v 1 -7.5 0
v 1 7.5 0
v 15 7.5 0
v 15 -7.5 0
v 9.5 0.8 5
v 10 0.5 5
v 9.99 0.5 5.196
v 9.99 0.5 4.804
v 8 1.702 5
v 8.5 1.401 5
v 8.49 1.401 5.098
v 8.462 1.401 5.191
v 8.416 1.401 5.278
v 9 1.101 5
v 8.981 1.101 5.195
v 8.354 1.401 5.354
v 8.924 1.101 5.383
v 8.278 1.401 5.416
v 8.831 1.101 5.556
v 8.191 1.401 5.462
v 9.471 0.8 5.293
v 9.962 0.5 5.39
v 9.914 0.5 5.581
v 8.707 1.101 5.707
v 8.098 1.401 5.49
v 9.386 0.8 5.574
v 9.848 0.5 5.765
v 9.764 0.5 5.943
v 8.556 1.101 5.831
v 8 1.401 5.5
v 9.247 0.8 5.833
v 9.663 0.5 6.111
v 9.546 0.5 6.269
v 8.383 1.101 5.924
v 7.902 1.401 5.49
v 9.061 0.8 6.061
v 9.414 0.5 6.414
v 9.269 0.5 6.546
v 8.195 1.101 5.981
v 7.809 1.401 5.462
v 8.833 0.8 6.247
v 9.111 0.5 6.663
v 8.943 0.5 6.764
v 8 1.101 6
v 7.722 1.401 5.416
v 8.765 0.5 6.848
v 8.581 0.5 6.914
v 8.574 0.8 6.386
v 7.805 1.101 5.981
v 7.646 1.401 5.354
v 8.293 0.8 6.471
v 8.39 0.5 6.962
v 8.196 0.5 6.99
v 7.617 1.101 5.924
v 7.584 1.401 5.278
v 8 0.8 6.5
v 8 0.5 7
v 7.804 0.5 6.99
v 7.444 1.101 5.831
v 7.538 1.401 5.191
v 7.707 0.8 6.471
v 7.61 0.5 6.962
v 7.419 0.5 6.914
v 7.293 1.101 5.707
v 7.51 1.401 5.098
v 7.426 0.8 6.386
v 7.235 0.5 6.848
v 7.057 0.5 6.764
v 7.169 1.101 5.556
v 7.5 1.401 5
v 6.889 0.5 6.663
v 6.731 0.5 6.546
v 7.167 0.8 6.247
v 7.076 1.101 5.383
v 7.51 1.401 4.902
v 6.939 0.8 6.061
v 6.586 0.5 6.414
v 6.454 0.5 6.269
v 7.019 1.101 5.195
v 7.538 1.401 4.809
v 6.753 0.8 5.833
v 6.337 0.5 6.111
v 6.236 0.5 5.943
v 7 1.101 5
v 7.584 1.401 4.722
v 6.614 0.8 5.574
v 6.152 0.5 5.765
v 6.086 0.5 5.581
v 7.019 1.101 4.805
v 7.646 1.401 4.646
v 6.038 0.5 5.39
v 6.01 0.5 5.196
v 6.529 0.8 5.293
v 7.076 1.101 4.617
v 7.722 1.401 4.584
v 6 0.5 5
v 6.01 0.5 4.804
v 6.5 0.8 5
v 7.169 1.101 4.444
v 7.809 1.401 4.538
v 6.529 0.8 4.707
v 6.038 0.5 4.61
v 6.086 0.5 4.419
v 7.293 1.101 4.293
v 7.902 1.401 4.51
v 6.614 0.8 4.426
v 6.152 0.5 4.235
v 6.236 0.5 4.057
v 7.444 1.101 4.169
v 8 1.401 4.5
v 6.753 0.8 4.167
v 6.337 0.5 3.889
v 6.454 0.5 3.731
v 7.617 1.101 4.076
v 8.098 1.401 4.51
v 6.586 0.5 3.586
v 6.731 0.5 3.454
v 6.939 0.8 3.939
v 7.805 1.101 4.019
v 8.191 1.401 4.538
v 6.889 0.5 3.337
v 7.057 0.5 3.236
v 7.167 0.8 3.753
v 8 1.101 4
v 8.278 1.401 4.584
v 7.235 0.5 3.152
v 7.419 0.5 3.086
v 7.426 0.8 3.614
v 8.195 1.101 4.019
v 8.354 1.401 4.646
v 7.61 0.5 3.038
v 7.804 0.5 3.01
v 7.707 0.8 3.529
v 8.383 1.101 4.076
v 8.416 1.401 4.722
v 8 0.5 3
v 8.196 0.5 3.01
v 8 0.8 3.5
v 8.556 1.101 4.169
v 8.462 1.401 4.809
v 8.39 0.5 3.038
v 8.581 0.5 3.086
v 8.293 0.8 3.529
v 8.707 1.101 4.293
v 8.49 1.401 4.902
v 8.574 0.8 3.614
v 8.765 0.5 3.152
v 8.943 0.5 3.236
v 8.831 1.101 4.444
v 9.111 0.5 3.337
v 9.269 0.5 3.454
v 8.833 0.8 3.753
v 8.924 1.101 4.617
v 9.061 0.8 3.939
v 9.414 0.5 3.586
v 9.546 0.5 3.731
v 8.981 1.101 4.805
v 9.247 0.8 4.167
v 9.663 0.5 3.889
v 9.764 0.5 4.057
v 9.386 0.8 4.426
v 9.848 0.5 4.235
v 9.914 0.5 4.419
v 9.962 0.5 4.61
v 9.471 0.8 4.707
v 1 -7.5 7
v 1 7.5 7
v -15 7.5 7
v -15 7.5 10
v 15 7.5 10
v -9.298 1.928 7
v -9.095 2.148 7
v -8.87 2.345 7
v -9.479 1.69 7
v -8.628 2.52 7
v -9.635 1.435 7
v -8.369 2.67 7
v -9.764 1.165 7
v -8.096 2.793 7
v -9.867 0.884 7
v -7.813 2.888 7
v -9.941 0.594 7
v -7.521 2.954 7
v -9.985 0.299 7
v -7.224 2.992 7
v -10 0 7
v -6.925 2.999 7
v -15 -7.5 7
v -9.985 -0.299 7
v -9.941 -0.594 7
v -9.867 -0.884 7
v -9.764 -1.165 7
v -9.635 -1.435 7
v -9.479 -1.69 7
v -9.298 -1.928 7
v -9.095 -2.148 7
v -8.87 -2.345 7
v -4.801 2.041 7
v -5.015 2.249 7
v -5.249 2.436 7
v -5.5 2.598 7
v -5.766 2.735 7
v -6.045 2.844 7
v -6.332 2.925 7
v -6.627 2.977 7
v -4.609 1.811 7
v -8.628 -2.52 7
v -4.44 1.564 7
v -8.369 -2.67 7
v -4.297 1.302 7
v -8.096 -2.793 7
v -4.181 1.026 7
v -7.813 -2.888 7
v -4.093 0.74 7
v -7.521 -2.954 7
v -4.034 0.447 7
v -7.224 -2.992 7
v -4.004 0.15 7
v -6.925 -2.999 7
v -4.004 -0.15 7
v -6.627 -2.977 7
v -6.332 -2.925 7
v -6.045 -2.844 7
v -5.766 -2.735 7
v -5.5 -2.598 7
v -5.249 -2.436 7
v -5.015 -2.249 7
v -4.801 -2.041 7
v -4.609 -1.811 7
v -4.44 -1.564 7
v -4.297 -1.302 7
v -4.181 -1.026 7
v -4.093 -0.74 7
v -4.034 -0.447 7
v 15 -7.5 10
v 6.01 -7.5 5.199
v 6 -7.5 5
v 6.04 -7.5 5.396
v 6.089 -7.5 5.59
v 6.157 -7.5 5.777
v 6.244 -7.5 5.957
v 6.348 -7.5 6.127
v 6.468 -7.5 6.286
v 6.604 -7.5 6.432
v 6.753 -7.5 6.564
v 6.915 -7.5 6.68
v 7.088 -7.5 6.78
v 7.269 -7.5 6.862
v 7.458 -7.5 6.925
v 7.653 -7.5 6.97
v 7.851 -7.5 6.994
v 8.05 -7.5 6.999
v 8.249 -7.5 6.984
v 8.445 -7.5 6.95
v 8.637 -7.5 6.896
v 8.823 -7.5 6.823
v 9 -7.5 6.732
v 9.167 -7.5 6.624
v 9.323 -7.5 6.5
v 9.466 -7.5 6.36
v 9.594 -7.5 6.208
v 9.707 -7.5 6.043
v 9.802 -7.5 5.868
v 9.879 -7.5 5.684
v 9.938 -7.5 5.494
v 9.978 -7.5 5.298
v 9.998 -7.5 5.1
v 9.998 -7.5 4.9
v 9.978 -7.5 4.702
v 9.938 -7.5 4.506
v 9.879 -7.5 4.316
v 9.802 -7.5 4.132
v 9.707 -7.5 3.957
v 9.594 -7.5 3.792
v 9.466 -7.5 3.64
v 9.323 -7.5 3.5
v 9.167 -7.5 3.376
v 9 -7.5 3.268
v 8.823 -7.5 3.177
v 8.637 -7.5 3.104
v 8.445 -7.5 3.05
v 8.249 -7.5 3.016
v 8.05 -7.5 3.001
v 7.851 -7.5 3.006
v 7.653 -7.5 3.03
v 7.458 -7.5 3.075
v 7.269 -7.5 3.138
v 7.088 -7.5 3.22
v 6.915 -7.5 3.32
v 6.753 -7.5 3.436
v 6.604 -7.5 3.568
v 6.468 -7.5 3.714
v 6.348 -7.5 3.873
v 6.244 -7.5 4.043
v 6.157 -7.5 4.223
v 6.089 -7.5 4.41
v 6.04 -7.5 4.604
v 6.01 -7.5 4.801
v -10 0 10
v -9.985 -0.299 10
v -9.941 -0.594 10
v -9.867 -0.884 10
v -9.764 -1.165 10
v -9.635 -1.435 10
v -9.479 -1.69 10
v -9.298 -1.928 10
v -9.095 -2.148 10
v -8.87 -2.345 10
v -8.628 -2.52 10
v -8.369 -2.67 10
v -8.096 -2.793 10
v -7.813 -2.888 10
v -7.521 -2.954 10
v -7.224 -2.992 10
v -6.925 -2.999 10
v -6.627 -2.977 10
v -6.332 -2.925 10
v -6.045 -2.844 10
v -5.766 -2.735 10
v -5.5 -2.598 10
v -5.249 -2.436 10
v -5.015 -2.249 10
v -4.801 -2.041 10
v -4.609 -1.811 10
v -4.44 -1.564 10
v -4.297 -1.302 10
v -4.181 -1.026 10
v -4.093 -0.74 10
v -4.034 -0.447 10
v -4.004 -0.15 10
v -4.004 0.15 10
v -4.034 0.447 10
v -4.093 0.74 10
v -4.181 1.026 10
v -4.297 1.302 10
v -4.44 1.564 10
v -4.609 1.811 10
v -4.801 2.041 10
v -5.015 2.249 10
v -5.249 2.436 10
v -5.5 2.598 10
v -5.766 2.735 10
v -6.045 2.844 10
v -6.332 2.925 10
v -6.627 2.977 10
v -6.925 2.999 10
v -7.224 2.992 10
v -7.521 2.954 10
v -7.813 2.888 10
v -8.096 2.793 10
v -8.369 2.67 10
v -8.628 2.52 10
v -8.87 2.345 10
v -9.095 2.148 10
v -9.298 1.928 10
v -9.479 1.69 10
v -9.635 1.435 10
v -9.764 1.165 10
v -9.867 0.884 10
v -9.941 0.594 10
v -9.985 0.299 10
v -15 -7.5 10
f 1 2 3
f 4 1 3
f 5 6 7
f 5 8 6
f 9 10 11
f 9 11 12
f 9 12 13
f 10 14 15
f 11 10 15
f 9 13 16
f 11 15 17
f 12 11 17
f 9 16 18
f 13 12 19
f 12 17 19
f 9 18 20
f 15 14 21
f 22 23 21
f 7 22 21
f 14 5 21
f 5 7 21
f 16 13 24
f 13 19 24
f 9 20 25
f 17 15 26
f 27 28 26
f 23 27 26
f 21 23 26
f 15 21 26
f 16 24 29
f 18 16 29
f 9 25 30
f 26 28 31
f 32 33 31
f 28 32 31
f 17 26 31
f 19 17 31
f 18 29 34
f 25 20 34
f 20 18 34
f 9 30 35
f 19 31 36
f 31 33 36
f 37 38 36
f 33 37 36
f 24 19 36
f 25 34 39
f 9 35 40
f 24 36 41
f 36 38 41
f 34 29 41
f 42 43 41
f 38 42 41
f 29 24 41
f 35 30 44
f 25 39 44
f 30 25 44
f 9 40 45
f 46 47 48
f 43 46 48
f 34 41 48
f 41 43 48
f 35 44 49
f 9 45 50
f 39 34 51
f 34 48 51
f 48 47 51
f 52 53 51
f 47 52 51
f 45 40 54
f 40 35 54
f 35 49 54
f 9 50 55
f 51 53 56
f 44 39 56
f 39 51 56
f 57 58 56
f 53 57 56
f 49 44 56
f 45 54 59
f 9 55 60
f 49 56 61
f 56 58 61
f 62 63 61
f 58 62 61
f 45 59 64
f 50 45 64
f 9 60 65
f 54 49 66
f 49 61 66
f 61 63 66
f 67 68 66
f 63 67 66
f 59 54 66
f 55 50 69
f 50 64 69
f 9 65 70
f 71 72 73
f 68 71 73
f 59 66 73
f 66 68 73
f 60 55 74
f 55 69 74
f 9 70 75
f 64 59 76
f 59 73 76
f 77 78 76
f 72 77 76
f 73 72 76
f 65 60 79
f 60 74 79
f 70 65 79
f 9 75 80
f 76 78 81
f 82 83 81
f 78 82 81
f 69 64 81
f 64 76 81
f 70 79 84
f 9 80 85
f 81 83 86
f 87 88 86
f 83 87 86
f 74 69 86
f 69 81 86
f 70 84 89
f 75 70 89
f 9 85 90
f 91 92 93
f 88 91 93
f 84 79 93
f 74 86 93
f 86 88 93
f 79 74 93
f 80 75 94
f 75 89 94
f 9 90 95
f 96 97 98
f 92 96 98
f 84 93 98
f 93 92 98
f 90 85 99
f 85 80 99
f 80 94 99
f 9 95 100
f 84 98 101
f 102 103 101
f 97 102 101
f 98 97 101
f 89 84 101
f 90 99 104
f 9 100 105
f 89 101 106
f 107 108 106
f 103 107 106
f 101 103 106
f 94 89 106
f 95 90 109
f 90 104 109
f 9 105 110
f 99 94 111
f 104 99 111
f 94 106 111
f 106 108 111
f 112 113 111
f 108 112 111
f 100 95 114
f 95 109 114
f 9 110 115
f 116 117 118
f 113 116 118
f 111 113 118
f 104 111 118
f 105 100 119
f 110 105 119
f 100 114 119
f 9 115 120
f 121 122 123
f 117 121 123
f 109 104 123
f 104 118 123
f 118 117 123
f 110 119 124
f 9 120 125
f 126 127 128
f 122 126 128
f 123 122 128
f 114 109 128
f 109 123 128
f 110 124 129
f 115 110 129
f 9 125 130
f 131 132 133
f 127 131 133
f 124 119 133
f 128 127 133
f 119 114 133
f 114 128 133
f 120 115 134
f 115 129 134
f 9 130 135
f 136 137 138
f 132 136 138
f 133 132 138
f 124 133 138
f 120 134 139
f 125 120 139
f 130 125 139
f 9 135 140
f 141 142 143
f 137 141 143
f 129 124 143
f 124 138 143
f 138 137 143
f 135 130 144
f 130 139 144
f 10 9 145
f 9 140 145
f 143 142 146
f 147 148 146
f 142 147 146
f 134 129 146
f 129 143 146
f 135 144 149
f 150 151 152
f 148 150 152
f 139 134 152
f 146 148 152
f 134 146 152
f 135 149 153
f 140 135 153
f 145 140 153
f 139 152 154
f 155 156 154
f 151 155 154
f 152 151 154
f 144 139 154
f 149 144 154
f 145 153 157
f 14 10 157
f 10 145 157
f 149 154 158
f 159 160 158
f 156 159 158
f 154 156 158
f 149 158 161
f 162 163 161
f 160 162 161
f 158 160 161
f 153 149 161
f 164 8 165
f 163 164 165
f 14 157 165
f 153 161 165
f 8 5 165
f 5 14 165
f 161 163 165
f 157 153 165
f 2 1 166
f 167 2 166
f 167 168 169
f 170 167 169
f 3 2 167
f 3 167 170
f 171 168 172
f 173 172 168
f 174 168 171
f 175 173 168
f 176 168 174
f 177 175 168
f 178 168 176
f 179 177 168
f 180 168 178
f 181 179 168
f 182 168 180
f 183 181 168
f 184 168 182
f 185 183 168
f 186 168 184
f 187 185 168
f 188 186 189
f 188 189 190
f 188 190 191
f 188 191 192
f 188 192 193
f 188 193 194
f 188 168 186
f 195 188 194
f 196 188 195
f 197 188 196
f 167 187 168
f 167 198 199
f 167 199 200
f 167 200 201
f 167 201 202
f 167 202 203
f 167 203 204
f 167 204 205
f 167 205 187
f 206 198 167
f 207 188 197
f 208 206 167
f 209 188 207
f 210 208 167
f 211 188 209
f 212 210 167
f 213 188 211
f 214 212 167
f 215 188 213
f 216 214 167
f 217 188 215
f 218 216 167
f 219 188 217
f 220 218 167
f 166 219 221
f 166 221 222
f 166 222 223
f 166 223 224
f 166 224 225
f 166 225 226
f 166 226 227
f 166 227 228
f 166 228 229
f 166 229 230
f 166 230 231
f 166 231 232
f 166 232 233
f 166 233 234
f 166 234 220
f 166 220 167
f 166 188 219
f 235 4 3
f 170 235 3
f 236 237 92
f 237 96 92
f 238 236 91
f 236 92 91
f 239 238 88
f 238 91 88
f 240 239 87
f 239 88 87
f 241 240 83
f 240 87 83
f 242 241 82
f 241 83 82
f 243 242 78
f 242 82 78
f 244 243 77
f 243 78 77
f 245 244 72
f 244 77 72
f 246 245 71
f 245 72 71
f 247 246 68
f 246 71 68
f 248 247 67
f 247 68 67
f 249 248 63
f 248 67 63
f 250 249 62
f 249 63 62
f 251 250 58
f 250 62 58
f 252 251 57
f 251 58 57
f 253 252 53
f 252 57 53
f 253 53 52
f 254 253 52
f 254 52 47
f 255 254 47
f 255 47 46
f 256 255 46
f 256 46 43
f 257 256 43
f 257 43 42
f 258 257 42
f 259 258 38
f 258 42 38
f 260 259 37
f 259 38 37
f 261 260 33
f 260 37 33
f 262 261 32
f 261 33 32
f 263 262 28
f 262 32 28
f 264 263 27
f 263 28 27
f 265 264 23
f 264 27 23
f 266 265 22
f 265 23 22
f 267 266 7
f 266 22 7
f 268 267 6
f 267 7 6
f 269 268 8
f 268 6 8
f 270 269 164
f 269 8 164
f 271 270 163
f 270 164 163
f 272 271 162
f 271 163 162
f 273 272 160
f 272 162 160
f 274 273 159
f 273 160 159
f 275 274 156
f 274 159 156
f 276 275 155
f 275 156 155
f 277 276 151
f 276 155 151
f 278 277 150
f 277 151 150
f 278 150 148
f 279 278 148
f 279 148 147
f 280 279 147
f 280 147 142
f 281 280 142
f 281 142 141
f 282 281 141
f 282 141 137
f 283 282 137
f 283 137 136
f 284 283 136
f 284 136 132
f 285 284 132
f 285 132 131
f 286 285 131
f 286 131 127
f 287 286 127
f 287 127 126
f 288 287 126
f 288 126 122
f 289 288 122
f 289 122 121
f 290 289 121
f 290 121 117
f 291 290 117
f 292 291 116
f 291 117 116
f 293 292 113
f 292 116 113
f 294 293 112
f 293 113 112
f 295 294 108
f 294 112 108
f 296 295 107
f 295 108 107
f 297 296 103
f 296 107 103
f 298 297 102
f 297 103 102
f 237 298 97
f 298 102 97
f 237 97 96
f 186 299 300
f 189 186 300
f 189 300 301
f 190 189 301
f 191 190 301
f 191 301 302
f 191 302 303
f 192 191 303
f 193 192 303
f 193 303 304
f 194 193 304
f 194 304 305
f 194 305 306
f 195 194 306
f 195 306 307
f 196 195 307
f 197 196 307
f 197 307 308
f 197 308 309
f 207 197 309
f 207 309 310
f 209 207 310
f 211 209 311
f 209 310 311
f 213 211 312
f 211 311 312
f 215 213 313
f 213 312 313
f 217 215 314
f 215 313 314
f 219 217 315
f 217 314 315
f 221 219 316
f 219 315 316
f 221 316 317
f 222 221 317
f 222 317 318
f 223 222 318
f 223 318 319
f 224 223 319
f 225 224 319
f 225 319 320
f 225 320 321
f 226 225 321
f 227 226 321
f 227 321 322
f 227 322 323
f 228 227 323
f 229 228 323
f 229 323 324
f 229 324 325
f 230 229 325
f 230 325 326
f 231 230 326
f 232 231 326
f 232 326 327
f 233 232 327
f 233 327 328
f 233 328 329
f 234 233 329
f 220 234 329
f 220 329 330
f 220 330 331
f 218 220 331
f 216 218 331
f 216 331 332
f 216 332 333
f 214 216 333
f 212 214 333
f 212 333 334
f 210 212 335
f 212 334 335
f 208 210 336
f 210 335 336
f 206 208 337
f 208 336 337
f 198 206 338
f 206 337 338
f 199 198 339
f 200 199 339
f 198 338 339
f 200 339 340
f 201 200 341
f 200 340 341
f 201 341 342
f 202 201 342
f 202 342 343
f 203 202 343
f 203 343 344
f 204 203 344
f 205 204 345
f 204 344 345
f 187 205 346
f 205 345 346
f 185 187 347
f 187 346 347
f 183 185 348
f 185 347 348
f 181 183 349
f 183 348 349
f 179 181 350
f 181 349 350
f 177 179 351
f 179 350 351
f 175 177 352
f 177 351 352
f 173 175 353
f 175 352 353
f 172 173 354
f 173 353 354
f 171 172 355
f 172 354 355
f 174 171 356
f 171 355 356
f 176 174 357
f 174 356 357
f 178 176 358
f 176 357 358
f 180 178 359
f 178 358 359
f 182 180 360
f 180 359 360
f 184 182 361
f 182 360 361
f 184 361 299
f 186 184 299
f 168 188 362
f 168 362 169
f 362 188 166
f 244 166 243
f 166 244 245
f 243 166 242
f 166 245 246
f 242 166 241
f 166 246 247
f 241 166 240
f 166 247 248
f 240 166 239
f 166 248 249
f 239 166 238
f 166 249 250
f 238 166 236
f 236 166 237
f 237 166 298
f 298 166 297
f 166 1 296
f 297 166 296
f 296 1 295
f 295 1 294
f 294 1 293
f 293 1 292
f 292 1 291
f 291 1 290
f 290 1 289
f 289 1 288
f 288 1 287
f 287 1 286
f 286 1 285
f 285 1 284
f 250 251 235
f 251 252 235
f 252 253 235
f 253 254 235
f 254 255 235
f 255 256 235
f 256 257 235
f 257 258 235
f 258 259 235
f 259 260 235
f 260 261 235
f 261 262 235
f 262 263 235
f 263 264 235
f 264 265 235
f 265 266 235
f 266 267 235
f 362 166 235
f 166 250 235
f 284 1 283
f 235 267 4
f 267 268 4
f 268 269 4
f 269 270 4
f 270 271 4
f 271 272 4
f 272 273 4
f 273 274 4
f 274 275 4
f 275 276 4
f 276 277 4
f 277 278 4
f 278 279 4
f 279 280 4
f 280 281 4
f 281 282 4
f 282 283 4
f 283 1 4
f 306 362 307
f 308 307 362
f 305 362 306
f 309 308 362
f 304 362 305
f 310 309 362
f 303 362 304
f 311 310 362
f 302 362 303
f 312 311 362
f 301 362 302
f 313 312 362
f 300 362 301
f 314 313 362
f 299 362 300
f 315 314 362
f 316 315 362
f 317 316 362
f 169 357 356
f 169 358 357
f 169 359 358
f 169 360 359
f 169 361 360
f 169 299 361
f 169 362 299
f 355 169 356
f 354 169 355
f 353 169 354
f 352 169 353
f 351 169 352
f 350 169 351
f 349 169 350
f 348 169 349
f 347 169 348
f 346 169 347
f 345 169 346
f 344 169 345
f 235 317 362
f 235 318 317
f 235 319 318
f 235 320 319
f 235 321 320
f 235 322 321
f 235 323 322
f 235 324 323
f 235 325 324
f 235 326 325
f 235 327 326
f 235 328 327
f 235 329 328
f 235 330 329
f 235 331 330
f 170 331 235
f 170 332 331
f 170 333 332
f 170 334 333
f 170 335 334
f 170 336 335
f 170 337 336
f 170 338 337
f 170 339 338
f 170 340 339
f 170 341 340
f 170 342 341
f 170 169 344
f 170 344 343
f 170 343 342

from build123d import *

# Parameters (mm, degrees)
F0_W     = 30
F0_H     = 15
F1_DEPTH = 10
F2_D     = 6
F4_D     = 4
F4_DEPTH = 8
F4_TIP   = 1.2017212381
F5_W     = 16
F5_H     = 7
F6_DEPTH = 7.5


with BuildPart() as f1:
    # F0 (on Top) → F1 (new body)
    with BuildSketch(Plane.XY):
        Rectangle(F0_W, F0_H)
    extrude(amount=F1_DEPTH)

    # F2 (through all)
    with Locations(Plane(origin=(0, 0, 0), x_dir=(1, 0, 0), z_dir=(0, 0, -1))):
        with Locations((-7, 0)):
            Hole(F2_D / 2)

    # F4
    with Locations(Plane.XZ.offset(7.5)):
        with Locations((8, 5)):
            Hole(F4_D / 2, depth=F4_DEPTH)
            with Locations((0, 0, -(F4_DEPTH + F4_TIP / 2))):  # 118° drill point
                Cone(0, F4_D / 2, F4_TIP, mode=Mode.SUBTRACT)

    # F5 (on Front) → F6 (cut, symmetric)
    with BuildSketch(Plane.XZ):
        with Locations((-7, 3.5)):
            Rectangle(F5_W, F5_H)
    extrude(amount=F6_DEPTH, both=True, mode=Mode.SUBTRACT)


solid = f1.part
